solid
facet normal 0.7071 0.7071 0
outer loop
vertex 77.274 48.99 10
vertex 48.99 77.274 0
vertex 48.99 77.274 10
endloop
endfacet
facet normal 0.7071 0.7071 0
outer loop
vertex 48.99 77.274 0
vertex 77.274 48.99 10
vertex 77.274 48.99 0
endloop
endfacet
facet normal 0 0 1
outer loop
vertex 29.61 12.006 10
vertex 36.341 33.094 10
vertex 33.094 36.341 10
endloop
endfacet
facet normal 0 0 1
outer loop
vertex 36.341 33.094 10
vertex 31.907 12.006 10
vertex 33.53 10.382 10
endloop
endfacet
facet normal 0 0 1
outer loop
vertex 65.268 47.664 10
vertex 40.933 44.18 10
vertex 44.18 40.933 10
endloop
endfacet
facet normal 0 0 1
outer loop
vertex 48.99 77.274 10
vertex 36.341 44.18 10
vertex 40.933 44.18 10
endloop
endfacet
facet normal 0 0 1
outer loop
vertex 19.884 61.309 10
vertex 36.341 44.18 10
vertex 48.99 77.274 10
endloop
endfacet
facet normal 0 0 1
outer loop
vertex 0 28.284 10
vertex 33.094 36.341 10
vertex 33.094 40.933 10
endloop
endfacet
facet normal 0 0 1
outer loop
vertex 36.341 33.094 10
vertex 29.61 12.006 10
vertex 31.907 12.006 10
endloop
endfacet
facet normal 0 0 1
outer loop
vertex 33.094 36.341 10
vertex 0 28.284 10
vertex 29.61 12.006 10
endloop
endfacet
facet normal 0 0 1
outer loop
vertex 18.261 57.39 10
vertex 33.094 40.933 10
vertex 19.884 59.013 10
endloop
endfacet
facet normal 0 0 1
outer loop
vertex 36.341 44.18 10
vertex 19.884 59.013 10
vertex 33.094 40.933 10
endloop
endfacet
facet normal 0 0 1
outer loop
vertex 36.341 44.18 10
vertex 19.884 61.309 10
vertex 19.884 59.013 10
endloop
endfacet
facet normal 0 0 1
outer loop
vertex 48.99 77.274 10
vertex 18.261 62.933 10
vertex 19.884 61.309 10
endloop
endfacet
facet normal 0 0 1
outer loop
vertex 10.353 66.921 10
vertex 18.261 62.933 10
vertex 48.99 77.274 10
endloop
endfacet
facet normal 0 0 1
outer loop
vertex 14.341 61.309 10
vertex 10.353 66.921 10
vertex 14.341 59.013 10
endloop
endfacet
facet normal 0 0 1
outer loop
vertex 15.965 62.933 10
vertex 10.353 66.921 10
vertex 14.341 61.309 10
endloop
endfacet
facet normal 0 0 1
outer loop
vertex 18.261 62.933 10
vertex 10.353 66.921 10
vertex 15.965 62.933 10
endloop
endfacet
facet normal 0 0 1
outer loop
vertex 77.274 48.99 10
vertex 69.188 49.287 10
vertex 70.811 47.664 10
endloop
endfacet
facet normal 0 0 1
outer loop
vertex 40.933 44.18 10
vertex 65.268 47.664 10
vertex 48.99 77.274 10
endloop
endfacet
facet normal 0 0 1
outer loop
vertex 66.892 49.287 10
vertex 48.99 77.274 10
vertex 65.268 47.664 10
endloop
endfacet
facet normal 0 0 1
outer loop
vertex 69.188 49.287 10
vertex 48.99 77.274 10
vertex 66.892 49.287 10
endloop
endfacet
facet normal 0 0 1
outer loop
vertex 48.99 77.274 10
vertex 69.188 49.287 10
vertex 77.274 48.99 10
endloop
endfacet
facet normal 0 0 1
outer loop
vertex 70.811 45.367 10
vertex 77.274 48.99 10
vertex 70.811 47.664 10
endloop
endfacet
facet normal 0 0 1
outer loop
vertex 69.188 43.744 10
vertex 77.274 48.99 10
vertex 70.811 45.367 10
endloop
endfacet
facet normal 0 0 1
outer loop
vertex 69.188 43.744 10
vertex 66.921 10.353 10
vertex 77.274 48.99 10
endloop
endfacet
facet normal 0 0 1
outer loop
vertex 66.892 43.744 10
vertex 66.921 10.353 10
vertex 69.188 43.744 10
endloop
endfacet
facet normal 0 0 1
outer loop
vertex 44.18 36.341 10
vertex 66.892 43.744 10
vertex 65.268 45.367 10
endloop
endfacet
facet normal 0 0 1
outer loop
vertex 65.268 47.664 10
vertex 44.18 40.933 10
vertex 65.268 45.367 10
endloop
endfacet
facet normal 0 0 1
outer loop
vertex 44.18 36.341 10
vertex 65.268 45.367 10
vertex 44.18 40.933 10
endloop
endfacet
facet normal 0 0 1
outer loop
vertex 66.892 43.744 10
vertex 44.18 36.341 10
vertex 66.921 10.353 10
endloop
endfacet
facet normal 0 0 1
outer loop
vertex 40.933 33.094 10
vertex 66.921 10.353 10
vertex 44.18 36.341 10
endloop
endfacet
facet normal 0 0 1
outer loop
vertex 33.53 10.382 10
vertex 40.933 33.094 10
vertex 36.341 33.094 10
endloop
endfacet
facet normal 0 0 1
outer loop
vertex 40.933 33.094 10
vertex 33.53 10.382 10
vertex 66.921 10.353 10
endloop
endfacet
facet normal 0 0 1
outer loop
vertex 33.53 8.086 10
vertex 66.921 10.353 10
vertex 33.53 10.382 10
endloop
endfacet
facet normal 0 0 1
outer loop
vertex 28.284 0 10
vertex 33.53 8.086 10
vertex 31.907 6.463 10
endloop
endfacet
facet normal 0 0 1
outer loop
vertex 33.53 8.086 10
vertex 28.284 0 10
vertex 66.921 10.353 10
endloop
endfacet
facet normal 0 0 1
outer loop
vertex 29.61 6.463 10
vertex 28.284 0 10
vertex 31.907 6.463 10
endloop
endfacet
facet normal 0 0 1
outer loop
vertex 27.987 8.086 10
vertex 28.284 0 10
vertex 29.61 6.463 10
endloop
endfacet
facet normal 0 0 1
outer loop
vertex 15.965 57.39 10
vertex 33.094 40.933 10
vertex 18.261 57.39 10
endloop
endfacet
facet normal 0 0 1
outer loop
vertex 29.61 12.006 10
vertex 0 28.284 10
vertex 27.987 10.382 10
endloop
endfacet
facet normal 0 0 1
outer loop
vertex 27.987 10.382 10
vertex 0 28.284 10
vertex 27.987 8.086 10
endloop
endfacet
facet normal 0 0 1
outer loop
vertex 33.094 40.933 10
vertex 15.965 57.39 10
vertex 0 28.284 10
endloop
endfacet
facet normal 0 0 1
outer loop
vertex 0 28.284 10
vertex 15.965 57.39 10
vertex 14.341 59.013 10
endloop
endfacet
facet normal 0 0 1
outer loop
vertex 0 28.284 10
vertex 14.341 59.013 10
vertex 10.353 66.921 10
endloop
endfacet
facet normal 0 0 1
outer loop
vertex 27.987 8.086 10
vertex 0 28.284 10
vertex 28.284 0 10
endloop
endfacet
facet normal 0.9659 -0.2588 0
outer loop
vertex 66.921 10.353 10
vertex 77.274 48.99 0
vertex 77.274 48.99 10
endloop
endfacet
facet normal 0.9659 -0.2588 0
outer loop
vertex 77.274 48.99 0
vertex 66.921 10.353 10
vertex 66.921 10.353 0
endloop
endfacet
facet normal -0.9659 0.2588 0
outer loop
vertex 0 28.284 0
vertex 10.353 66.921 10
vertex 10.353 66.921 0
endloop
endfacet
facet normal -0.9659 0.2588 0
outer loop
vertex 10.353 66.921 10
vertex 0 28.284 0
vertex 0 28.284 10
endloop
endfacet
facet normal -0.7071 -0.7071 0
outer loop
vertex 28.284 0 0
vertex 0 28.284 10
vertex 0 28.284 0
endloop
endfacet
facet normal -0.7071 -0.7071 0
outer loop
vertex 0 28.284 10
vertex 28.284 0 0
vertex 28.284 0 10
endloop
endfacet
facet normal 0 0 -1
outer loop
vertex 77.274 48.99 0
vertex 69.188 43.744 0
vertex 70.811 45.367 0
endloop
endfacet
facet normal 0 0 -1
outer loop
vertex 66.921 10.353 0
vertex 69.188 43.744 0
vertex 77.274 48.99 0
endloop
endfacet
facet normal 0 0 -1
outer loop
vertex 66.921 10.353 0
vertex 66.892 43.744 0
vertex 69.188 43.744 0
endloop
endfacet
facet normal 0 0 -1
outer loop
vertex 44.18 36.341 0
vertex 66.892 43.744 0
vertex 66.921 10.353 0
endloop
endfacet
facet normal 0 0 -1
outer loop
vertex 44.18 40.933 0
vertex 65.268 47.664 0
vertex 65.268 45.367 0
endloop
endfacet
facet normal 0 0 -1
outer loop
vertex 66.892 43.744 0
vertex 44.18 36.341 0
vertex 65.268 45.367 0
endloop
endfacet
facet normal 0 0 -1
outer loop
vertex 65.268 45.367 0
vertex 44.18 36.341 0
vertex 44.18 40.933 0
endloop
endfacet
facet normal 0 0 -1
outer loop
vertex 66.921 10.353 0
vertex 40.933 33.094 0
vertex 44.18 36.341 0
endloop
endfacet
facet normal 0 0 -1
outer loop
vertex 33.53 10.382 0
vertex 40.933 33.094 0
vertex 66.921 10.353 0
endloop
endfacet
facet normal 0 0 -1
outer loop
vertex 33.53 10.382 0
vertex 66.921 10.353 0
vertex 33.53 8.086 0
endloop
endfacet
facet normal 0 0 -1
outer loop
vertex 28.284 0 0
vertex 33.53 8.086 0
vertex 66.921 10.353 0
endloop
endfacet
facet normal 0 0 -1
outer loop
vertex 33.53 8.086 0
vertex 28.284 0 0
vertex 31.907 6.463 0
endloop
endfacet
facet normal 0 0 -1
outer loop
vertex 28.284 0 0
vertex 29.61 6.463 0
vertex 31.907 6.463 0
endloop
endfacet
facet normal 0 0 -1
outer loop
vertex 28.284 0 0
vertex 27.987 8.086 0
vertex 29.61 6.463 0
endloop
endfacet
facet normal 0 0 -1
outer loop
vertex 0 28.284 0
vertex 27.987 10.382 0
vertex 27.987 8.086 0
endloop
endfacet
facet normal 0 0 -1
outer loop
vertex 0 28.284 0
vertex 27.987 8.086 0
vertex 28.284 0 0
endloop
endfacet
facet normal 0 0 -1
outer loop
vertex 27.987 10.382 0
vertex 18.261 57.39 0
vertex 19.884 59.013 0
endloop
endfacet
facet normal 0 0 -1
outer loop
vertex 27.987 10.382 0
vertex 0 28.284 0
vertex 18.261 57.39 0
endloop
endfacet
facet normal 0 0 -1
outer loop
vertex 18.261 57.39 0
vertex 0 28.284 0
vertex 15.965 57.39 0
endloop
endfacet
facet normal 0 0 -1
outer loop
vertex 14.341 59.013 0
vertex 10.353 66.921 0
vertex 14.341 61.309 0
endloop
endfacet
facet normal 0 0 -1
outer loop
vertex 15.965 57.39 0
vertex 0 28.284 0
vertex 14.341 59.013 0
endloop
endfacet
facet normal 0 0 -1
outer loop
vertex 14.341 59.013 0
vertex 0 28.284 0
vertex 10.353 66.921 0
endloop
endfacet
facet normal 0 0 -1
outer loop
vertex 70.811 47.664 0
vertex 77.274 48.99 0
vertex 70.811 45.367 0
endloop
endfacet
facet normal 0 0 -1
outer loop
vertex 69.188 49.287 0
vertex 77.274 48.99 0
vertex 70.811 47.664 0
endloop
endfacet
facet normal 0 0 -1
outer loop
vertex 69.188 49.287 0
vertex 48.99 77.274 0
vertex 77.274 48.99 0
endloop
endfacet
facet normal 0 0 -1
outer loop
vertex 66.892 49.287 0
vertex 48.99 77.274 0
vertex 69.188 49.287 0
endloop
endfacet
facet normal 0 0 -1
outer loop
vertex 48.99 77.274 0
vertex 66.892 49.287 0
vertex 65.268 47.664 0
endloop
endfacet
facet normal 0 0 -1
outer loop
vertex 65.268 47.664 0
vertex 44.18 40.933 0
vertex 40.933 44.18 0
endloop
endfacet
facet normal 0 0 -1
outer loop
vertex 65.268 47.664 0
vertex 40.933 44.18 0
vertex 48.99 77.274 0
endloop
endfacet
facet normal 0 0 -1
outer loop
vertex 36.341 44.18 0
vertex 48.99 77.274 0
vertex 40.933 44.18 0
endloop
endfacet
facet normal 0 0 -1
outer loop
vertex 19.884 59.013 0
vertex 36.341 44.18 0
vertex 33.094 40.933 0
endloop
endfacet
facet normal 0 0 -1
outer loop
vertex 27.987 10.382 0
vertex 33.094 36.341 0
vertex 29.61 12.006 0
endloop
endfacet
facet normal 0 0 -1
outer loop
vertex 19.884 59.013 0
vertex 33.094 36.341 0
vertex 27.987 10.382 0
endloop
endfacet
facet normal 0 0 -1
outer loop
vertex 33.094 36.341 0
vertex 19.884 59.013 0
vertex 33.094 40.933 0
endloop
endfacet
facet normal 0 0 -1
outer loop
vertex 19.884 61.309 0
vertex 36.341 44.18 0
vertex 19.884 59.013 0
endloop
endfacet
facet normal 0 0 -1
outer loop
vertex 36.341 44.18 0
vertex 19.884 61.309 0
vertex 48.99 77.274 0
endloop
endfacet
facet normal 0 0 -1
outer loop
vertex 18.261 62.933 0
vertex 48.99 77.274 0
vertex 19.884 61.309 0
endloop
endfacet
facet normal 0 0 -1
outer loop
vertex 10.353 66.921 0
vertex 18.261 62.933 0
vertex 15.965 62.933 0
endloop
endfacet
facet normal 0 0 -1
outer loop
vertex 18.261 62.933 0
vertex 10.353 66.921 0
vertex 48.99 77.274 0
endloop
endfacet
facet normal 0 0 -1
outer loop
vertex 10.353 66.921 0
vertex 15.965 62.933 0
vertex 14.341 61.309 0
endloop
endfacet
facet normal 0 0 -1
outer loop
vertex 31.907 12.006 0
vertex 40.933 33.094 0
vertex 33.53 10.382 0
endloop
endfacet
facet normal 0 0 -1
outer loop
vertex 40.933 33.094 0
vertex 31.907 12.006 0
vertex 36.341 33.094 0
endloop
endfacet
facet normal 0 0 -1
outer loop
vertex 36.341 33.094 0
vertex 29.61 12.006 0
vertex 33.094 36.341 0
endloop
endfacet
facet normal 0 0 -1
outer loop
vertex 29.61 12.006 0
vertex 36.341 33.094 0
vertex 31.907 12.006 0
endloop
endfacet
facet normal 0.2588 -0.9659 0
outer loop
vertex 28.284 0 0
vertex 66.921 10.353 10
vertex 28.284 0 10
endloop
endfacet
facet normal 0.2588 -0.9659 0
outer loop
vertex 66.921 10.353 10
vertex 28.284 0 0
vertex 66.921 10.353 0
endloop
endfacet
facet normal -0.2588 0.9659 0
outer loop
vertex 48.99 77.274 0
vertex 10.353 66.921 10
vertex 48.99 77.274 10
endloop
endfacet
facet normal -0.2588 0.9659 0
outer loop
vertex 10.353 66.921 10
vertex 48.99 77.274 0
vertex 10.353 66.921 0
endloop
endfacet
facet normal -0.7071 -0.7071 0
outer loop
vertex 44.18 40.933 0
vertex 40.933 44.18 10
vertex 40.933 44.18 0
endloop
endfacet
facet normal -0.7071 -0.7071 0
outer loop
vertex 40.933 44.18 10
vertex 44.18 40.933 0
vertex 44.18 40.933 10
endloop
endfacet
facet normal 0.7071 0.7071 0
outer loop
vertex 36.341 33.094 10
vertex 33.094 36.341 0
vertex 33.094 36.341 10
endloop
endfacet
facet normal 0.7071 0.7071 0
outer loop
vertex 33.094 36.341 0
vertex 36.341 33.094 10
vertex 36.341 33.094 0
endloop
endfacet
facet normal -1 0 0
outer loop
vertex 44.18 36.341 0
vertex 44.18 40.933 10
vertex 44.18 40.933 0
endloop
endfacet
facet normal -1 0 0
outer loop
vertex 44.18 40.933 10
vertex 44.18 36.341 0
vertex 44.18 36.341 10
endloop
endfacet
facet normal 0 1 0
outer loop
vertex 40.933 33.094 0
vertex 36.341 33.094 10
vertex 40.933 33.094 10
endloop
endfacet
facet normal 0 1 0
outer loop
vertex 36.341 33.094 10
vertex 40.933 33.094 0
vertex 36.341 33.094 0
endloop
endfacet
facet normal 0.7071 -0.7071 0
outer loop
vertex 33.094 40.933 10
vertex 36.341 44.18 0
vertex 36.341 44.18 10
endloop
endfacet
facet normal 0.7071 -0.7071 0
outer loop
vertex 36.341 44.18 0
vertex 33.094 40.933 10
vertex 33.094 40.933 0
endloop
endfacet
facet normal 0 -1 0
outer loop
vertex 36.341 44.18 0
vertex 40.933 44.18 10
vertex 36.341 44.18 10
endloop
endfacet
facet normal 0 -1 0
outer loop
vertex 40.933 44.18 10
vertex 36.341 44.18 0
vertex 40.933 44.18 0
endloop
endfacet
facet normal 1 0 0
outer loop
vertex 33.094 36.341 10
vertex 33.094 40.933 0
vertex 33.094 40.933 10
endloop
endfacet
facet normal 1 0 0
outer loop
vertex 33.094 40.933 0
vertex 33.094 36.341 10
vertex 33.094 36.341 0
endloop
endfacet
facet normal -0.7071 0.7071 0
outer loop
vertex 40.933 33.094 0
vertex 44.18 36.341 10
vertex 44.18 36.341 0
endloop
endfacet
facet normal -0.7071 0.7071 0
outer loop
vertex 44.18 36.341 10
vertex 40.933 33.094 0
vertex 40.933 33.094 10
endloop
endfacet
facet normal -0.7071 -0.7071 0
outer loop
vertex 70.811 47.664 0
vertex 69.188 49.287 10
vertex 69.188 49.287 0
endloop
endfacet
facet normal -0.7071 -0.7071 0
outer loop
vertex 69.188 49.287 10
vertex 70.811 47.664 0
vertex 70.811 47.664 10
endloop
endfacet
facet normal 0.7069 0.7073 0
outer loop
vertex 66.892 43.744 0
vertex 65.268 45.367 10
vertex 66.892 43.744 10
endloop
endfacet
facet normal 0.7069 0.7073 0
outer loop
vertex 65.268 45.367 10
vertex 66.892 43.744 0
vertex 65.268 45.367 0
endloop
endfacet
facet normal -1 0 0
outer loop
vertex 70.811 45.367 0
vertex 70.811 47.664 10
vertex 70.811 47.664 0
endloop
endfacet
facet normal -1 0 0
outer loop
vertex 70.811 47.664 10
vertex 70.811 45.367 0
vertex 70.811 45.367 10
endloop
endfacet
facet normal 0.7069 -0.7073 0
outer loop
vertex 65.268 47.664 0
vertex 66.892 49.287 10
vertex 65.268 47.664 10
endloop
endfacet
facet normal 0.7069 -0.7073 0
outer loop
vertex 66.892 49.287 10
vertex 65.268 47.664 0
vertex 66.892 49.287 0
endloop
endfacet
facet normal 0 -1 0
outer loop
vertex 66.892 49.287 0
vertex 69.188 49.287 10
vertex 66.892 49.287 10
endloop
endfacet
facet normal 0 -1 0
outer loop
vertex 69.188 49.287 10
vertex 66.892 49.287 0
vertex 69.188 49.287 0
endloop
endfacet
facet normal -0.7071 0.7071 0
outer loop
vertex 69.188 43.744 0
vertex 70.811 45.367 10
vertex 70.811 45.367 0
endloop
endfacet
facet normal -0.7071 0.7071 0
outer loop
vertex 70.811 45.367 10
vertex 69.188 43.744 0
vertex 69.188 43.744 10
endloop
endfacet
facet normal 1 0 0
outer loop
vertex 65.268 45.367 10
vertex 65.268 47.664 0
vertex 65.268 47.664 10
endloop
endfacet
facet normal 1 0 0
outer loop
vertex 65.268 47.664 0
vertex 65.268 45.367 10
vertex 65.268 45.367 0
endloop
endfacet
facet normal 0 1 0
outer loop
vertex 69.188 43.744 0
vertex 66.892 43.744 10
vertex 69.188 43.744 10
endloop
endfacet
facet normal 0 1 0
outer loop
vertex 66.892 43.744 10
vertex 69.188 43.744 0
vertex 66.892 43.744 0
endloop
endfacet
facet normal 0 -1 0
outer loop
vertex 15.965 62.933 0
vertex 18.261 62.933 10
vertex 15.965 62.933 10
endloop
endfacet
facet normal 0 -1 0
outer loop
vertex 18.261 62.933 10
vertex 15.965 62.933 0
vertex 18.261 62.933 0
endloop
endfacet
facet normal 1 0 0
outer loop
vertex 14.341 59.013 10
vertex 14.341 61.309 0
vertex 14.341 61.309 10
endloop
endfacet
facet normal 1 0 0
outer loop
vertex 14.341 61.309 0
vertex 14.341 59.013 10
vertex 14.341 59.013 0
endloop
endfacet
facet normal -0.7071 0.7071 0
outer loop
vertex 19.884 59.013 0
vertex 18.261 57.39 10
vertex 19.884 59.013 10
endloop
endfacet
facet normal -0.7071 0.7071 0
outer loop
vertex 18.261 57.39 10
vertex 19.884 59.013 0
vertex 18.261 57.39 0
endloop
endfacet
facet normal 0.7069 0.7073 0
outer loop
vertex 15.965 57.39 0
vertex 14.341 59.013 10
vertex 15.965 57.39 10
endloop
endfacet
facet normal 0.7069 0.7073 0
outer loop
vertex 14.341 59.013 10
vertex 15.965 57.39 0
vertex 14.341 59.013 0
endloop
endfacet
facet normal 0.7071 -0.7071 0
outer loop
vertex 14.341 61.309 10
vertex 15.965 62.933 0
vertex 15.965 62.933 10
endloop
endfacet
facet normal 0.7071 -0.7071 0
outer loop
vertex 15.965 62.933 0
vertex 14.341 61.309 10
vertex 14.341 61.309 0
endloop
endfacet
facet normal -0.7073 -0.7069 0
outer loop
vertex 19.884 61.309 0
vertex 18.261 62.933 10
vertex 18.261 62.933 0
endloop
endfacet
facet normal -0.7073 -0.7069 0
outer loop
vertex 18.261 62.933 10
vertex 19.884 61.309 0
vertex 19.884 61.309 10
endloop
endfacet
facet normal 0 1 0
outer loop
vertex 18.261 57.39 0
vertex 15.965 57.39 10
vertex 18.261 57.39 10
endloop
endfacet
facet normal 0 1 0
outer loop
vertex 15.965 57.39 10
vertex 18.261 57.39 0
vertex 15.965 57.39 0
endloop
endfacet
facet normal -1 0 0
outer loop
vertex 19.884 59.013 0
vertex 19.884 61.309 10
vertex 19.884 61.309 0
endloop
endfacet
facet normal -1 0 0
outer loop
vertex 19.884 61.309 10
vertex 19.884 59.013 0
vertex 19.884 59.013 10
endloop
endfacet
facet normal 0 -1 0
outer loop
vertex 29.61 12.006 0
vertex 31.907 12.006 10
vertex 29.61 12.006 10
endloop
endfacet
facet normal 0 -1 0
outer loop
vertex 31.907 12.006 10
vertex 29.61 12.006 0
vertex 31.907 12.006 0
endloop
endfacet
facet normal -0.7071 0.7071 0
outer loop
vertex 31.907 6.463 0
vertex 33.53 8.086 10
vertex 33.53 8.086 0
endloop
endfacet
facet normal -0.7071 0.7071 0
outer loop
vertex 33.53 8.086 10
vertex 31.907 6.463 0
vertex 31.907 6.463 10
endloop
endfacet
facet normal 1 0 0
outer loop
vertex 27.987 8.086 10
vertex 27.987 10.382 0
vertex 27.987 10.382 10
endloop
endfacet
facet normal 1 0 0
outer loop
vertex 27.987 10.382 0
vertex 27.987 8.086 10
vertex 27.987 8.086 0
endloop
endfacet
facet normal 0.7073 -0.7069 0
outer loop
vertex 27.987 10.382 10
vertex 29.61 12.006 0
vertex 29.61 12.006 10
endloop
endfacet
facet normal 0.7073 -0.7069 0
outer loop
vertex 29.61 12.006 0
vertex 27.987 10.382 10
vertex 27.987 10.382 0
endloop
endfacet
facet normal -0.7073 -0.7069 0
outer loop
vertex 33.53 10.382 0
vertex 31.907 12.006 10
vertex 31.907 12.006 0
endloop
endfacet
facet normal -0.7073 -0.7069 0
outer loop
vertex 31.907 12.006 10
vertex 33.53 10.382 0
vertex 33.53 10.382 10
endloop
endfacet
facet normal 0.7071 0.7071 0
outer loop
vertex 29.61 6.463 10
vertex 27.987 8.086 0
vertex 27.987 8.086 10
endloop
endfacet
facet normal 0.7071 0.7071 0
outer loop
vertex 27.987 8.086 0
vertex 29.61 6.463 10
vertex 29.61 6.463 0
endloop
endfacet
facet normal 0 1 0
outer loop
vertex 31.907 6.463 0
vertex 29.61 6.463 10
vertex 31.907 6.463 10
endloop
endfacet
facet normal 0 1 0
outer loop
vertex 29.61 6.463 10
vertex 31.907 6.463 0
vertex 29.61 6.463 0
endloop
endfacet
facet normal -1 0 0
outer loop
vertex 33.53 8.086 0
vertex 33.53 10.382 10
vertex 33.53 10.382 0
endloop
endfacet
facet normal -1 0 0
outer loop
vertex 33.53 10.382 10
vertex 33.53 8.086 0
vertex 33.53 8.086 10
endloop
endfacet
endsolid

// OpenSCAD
$fn = 32;

// ----------------------------------------------------------------------
// Polygon plate: 6-gon R40, 3 bolt windows
// ----------------------------------------------------------------------

// --- parameters (mm) ---
sides = 6;                // number of polygon sides
plate_r = 40;             // circumscribed radius of the polygon
bore_r = 6;               // centre bore radius
bolts = 3;                // number of bolt windows
ring_r = 30.44;           // bolt-circle radius
bolt_r = 3;               // bolt window radius
plate_t = 10;             // plate thickness, Z (extrusion height)

plate_d = 2 * plate_r;  // circumscribed diameter
bore_d = 2 * bore_r;  // centre bore diameter
bolt_d = 2 * bolt_r;  // bolt window diameter
ring_d = 2 * ring_r;  // bolt-circle diameter

profile = [[77.274, 48.99], [48.99, 77.274], [10.353, 66.921], [0, 28.284], [28.284, 0], [66.921, 10.353]];  // primary outline, 6 points, counter clockwise
void_1 = [[44.18, 40.933], [40.933, 44.18], [36.341, 44.18], [33.094, 40.933], [33.094, 36.341], [36.341, 33.094], [40.933, 33.094], [44.18, 36.341]];  // centre bore, 8 points
void_2 = [[70.811, 47.664], [69.188, 49.287], [66.892, 49.287], [65.268, 47.664], [65.268, 45.367], [66.892, 43.744], [69.188, 43.744], [70.811, 45.367]];  // bolt window 1, 8 points
void_3 = [[19.884, 61.309], [18.261, 62.933], [15.965, 62.933], [14.341, 61.309], [14.341, 59.013], [15.965, 57.39], [18.261, 57.39], [19.884, 59.013]];  // bolt window 2, 8 points
void_4 = [[33.53, 10.382], [31.907, 12.006], [29.61, 12.006], [27.987, 10.382], [27.987, 8.086], [29.61, 6.463], [31.907, 6.463], [33.53, 8.086]];  // bolt window 3, 8 points

// --- the one profile operation ---
difference() {
  linear_extrude(height = plate_t) polygon(points = profile);
  translate([0, 0, -1])
    linear_extrude(height = plate_t + 2) polygon(points = void_1);
  translate([0, 0, -1])
    linear_extrude(height = plate_t + 2) polygon(points = void_2);
  translate([0, 0, -1])
    linear_extrude(height = plate_t + 2) polygon(points = void_3);
  translate([0, 0, -1])
    linear_extrude(height = plate_t + 2) polygon(points = void_4);
}
